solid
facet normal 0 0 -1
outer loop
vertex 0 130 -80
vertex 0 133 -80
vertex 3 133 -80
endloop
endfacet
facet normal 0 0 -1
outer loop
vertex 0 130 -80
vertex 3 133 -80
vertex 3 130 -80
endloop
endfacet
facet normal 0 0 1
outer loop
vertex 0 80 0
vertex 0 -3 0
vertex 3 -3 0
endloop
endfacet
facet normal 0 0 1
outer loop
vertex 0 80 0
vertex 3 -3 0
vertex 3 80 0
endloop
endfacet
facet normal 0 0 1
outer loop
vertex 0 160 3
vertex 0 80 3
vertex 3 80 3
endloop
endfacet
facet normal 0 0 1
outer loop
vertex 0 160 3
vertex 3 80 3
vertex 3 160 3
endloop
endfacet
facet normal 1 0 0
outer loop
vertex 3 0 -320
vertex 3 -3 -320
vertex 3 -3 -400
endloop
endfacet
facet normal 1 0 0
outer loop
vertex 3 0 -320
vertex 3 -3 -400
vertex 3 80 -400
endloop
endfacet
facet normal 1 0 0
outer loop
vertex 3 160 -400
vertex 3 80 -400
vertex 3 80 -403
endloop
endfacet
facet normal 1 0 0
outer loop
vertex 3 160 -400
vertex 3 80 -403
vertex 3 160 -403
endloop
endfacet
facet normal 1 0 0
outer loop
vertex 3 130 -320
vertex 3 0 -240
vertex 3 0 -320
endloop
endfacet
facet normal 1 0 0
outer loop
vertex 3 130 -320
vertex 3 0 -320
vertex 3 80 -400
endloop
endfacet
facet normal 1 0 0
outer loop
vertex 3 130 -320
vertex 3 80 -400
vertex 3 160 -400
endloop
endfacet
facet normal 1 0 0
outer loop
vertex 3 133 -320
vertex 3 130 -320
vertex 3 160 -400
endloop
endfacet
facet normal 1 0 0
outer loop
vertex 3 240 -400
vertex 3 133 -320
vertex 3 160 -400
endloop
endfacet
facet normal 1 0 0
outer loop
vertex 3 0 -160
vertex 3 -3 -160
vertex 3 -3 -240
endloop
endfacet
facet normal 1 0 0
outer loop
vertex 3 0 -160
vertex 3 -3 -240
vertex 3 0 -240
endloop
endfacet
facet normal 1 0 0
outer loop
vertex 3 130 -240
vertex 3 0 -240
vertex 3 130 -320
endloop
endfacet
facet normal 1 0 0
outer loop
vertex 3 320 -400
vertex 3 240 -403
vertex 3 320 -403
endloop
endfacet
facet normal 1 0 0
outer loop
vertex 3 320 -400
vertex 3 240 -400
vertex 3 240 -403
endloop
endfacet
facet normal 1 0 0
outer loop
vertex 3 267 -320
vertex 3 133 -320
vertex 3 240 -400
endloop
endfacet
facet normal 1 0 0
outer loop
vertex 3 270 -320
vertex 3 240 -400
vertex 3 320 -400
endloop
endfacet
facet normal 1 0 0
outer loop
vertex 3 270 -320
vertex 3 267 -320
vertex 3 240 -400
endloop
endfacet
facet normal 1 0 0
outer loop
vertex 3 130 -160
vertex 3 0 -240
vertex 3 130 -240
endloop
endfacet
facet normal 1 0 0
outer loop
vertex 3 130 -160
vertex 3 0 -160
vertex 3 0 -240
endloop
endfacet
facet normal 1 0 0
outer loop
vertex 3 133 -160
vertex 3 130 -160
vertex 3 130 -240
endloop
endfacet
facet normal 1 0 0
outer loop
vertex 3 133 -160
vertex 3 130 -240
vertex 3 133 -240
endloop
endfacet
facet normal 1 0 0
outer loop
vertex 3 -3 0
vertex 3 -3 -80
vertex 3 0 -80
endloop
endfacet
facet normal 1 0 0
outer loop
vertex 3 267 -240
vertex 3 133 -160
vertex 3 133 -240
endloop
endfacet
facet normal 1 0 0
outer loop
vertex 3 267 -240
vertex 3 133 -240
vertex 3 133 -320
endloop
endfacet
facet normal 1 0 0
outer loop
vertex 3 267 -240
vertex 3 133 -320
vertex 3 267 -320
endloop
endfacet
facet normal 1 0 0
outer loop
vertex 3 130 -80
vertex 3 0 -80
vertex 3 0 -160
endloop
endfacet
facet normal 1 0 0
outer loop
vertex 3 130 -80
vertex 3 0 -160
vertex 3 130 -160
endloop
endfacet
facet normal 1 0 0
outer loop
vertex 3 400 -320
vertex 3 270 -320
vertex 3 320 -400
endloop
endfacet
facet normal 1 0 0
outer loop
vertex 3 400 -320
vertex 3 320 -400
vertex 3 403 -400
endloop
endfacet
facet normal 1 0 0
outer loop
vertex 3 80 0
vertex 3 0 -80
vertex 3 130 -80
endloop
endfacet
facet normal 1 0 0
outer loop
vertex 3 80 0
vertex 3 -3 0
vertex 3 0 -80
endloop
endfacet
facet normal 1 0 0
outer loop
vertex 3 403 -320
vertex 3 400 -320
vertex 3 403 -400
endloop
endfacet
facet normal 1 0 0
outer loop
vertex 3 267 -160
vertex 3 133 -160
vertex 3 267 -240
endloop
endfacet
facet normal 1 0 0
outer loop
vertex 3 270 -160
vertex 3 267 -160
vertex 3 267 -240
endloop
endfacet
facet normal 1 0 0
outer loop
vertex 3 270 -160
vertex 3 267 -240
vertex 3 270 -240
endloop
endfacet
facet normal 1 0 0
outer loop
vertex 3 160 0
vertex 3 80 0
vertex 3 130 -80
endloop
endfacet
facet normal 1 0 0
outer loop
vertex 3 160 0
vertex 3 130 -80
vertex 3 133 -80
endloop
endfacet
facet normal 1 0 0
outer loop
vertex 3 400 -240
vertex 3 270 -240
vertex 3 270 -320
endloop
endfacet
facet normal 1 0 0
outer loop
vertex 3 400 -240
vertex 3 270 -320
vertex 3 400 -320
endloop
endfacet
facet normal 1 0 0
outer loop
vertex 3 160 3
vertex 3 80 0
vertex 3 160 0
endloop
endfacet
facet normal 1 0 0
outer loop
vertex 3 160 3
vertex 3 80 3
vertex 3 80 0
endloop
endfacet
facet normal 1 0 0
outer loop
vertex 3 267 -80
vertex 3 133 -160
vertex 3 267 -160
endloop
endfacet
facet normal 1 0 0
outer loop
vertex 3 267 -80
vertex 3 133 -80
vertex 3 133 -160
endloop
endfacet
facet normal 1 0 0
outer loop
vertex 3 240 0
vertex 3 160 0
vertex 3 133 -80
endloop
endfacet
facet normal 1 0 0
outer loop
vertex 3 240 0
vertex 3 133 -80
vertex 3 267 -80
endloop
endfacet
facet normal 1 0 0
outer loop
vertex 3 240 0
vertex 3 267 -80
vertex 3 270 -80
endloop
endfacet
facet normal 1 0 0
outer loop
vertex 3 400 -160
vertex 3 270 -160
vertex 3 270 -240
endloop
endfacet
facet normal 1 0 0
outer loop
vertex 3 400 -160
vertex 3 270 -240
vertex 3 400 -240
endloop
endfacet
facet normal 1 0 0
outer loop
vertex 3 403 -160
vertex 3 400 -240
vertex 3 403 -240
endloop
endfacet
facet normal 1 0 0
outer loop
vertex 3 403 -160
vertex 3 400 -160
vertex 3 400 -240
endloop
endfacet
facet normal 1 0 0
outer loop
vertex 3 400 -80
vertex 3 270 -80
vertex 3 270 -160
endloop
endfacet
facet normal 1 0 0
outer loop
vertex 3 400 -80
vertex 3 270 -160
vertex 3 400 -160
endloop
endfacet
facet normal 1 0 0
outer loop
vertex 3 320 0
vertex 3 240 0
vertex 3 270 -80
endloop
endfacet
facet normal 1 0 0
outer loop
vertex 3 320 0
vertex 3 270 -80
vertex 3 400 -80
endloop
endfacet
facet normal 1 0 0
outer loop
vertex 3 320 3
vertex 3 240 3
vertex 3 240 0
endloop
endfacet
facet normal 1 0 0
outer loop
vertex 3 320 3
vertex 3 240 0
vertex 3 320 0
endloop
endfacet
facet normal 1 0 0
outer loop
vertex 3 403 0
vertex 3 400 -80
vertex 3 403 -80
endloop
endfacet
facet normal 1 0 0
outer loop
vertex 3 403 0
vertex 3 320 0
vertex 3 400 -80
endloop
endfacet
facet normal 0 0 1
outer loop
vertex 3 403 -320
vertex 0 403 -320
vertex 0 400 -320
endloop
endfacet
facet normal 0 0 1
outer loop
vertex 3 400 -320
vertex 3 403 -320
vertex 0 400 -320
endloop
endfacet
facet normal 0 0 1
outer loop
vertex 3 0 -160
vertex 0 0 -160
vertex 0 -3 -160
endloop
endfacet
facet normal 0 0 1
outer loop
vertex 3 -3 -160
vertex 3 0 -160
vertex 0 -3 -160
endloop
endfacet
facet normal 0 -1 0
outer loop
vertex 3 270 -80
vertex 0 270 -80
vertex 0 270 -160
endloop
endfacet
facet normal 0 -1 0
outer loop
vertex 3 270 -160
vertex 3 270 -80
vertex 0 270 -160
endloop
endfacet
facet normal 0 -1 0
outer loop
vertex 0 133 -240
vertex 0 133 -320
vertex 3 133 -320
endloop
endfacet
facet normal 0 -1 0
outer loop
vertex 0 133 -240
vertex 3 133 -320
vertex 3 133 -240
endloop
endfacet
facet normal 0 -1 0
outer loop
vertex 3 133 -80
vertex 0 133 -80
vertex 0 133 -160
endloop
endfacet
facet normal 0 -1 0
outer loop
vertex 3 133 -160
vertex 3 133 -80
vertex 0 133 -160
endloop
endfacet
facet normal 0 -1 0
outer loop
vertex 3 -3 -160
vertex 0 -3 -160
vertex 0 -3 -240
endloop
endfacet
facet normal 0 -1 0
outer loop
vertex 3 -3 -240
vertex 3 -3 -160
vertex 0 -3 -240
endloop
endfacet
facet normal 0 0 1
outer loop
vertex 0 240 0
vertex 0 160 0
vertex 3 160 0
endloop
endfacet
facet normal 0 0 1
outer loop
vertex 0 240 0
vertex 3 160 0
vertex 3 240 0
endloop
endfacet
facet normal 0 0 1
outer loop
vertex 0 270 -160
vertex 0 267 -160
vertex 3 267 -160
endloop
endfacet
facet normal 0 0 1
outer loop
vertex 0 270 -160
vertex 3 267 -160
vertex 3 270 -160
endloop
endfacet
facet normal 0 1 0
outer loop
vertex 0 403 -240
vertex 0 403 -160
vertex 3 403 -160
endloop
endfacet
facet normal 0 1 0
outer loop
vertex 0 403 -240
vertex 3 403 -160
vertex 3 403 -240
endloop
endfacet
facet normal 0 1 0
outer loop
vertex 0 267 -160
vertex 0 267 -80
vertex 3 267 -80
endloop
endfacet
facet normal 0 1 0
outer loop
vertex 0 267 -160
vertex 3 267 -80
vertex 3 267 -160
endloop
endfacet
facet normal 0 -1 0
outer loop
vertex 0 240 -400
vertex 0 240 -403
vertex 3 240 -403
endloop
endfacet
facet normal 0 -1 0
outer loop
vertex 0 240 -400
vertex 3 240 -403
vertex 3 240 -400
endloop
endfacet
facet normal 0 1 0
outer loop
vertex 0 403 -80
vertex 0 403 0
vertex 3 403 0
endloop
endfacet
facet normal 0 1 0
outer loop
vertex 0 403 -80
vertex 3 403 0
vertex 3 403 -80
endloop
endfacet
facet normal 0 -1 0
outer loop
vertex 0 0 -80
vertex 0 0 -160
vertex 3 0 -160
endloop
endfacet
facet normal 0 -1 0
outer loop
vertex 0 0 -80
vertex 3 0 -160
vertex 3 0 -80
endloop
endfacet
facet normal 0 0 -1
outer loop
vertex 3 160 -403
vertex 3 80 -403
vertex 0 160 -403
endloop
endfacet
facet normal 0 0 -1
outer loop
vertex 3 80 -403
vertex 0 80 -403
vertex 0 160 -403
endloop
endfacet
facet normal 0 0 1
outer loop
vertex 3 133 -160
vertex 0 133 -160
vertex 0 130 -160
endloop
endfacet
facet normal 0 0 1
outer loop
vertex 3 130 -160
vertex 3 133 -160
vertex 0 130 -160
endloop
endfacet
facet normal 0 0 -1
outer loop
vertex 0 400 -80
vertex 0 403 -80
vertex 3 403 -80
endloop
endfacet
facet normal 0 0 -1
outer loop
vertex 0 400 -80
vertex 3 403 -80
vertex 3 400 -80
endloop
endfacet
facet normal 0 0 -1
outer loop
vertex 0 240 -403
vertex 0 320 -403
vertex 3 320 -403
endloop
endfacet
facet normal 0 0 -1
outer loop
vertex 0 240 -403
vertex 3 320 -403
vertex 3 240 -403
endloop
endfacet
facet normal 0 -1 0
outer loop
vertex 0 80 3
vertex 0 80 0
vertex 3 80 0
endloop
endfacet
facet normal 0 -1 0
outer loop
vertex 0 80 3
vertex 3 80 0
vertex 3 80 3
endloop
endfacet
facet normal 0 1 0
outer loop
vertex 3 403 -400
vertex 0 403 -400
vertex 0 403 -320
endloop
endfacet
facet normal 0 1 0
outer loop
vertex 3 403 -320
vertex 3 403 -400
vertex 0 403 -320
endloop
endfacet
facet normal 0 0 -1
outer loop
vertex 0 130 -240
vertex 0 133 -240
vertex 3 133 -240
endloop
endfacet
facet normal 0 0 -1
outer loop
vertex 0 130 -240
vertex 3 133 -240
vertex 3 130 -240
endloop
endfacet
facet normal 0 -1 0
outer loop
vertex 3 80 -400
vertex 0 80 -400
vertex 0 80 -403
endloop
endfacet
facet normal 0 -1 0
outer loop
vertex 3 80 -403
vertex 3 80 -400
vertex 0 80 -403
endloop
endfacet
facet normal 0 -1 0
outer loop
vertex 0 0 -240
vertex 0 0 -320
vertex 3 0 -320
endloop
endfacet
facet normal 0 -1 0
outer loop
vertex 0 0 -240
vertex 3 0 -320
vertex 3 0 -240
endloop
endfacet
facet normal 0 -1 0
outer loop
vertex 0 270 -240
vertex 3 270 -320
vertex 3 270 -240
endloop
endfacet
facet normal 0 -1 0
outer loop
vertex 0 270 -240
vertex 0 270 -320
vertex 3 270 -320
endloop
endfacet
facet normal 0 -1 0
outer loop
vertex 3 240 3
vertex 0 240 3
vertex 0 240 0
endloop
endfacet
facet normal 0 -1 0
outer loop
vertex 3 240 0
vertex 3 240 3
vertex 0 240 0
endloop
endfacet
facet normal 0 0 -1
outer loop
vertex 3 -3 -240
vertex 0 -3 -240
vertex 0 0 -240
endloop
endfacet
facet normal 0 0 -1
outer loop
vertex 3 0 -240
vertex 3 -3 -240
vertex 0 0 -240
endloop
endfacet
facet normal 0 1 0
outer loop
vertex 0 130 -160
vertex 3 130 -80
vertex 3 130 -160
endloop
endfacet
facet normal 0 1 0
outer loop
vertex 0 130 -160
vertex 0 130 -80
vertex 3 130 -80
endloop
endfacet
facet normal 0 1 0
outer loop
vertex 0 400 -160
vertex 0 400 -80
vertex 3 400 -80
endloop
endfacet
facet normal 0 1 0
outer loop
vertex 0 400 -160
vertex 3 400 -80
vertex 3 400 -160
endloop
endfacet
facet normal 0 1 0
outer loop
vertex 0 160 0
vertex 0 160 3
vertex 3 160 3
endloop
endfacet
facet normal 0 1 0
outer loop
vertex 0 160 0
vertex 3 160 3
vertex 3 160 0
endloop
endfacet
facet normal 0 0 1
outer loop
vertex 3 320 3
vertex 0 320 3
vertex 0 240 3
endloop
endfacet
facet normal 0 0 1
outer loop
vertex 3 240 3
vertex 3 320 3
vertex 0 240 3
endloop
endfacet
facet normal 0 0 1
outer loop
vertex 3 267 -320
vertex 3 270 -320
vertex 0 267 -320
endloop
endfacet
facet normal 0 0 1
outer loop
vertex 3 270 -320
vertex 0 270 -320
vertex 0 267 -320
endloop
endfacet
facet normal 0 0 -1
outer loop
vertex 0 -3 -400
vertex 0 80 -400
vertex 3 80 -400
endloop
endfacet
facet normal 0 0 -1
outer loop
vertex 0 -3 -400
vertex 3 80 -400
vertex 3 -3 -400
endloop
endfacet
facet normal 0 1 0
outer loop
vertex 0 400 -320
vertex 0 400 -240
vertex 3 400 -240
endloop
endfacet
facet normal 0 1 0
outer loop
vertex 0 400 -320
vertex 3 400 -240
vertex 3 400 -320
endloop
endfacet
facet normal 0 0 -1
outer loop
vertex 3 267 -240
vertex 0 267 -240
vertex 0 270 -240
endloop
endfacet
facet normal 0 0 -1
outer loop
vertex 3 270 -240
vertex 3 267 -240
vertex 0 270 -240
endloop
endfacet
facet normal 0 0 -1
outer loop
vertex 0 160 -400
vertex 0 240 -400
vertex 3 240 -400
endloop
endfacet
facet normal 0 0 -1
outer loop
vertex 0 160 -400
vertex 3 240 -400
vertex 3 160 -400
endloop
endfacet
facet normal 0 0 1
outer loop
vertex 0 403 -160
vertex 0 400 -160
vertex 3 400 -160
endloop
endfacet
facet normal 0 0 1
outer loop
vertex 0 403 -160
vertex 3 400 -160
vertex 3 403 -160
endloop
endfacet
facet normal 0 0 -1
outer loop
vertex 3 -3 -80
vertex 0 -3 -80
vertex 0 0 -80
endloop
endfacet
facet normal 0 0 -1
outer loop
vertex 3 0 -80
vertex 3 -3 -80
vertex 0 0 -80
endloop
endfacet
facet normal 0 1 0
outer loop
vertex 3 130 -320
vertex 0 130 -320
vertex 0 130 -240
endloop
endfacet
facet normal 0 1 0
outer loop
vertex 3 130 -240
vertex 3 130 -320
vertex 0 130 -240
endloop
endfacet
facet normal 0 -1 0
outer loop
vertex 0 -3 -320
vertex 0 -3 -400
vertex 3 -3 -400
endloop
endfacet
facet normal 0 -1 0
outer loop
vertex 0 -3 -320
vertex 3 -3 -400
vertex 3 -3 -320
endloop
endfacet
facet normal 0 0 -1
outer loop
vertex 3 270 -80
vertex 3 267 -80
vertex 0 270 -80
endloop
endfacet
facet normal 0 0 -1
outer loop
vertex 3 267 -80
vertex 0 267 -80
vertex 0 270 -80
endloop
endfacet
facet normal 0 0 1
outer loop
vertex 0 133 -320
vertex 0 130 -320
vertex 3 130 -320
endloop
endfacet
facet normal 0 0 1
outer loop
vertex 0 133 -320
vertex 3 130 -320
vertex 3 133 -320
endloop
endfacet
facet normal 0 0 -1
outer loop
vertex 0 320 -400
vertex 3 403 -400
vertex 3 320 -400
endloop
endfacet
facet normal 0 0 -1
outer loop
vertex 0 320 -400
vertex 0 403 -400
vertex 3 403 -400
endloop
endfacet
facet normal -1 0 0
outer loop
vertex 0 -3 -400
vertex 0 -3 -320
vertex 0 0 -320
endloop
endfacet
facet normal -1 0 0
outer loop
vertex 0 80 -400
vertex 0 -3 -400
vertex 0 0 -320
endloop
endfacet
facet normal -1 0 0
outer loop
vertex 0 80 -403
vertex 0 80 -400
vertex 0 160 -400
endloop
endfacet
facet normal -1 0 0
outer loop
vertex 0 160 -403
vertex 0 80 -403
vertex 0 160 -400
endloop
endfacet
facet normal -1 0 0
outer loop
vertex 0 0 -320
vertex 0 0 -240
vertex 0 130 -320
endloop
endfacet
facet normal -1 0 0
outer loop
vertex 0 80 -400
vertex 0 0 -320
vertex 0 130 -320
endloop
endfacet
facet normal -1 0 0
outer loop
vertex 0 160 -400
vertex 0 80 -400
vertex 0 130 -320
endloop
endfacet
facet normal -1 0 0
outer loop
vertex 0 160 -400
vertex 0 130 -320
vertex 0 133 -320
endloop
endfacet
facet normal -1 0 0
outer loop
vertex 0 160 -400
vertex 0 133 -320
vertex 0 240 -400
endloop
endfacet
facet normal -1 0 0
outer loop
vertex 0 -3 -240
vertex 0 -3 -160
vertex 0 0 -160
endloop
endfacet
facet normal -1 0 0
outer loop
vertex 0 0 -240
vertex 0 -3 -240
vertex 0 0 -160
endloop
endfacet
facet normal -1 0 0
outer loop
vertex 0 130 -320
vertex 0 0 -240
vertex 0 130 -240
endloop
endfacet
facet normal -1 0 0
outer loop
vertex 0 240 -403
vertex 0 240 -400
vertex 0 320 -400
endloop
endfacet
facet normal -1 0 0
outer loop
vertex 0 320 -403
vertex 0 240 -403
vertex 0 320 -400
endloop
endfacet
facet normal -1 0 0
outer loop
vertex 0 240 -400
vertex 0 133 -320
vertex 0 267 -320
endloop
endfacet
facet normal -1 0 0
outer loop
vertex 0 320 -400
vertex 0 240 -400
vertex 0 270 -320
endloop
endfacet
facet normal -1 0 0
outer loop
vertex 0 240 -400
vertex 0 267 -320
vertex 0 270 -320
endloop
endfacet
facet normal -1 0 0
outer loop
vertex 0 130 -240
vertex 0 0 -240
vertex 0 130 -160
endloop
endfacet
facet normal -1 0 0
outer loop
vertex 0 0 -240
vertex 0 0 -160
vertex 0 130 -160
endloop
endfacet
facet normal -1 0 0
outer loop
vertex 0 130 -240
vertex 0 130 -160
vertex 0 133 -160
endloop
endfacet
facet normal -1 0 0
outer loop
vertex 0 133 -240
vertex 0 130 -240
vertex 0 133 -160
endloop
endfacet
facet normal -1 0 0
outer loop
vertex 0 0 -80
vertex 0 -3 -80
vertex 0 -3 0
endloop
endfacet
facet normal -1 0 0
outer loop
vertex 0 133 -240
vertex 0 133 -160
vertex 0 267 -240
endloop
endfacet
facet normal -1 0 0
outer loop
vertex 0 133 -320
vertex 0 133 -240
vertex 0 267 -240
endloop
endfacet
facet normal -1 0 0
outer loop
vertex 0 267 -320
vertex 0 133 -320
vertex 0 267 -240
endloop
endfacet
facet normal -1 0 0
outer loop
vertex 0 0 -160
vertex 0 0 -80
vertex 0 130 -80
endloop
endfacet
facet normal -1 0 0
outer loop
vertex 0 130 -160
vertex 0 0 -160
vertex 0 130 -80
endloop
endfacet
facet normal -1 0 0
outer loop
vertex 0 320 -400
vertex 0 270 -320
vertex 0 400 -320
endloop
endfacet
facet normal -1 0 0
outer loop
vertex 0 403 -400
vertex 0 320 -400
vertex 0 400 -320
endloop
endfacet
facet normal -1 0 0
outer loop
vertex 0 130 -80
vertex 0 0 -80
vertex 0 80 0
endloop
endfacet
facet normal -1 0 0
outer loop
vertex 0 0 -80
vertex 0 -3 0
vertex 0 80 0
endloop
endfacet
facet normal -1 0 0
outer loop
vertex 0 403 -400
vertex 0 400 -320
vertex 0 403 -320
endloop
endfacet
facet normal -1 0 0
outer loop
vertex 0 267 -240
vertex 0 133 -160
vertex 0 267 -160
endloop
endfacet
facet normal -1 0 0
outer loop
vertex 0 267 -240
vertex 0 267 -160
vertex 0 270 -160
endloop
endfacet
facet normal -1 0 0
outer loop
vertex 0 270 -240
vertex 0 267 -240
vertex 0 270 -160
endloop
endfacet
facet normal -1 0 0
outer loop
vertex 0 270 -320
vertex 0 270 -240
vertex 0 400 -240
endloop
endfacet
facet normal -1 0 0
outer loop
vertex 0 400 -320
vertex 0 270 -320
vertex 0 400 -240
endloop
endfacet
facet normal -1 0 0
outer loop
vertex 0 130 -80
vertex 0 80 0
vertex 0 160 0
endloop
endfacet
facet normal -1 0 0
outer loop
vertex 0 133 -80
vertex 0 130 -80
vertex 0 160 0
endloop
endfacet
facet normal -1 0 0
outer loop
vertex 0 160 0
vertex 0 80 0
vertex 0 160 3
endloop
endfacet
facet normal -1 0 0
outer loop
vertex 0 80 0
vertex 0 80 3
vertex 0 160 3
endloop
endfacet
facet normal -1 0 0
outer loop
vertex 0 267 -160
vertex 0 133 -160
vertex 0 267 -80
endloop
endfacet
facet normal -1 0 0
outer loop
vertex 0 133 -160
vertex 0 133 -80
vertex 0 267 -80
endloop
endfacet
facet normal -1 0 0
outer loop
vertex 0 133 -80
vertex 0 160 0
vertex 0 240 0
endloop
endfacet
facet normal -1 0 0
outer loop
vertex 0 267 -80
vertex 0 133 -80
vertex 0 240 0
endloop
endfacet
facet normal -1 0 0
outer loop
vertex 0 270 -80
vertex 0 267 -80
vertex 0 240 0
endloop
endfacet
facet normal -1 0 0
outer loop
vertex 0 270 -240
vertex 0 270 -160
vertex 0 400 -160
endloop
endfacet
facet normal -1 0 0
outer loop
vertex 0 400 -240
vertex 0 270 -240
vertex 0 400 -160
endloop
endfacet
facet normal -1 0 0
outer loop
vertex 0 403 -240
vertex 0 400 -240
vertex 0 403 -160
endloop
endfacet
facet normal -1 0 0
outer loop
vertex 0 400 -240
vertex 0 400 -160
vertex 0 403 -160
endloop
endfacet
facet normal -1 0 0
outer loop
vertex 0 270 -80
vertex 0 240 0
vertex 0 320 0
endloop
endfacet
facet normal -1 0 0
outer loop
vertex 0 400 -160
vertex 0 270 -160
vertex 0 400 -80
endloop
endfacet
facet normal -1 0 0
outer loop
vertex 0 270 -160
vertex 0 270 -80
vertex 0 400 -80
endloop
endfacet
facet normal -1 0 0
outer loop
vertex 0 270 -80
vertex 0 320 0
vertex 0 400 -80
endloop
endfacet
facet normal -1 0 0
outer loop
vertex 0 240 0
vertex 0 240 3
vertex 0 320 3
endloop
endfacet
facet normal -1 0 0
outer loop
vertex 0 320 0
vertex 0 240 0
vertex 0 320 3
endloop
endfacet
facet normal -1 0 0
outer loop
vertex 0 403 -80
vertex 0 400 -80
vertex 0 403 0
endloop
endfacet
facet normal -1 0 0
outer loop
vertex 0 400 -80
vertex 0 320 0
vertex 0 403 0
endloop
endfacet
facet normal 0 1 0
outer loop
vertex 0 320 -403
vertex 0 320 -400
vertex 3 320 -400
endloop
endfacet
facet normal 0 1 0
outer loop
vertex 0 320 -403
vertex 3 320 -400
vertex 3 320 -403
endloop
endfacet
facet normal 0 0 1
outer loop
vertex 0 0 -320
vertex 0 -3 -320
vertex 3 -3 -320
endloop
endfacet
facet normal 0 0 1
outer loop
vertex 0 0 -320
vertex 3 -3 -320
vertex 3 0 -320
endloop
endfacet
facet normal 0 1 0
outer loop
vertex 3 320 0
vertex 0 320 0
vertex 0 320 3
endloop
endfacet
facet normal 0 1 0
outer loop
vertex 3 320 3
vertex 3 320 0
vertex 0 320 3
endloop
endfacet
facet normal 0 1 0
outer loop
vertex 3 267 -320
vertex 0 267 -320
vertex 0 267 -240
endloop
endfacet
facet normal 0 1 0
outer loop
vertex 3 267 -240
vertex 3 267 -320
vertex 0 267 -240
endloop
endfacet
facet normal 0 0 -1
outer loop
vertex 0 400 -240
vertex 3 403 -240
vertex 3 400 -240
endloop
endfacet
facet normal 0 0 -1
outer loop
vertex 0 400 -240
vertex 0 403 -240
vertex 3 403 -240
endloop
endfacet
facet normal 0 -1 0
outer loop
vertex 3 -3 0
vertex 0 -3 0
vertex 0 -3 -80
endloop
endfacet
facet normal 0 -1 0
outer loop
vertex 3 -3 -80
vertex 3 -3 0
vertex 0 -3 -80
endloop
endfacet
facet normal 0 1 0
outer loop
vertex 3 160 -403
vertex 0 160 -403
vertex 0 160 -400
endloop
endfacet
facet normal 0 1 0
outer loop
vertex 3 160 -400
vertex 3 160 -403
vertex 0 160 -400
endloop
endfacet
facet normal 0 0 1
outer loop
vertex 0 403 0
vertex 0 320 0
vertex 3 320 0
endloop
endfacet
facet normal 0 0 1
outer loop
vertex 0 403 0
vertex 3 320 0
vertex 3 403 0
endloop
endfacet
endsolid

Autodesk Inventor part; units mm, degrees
ref_plane "YZ Plane" through (0, 0, 0) normal (1, 0, 0) x (0, 1, 0)
ref_plane "XZ Plane" through (0, 0, 0) normal (0, 1, 0) x (-1, 0, 0)
ref_plane "XY Plane" through (0, 0, 0) normal (0, 0, 1) x (1, 0, 0)
sketch "Sketch1" plane through (0, 0, 0) normal (1, 0, 0) x (0, 1, 0)
  line L0 (0, 0) -> (400, 0)
  line L1 (400, 0) -> (400, -400)
  line L2 (400, -400) -> (0, -400)
  line L3 (0, -400) -> (0, 0)
  line L4 (400, 0) -> (403, 0)
  line L5 (403, 0) -> (403, -80)
  line L6 (403, -80) -> (400, -80)
  line L7 (400, -400) -> (403, -400)
  line L8 (403, -400) -> (403, -320)
  line L9 (403, -320) -> (400, -320)
  line L10 (400, -160) -> (403, -160)
  line L11 (403, -160) -> (403, -240)
  line L12 (403, -240) -> (400, -240)
  line L13 (80, 0) -> (80, 3)
  line L14 (80, 3) -> (160, 3)
  line L15 (160, 3) -> (160, 0)
  line L16 (320, 0) -> (320, 3)
  line L17 (320, 3) -> (240, 3)
  line L18 (240, 3) -> (240, 0)
  line L19 (200, 0) -> (200, -400) construction
  line L20 (0, -200) -> (400, -200) construction
  line L21 (0, -400) -> (400, -400)
  line L22 (80, -400) -> (80, -403)
  line L23 (80, -403) -> (160, -403)
  line L24 (160, -403) -> (160, -400)
  line L25 (320, -400) -> (320, -403)
  line L26 (320, -403) -> (240, -403)
  line L27 (240, -403) -> (240, -400)
  line L28 (0, 0) -> (0, -400)
  line L29 (0, 0) -> (-3, 0)
  line L30 (-3, 0) -> (-3, -80)
  line L31 (-3, -80) -> (0, -80)
  line L32 (0, -400) -> (-3, -400)
  line L33 (-3, -400) -> (-3, -320)
  line L34 (-3, -320) -> (0, -320)
  line L35 (0, -160) -> (-3, -160)
  line L36 (-3, -160) -> (-3, -240)
  line L37 (-3, -240) -> (0, -240)
  line L38 (0, 0) -> (130, 0)
  line L39 (130, 0) -> (133, 0)
  line L40 (133, 0) -> (267, 0)
  line L41 (267, 0) -> (270, 0)
  line L42 (133, -80) -> (130, -80)
  line L43 (133, -80) -> (133, -160)
  line L44 (133, -160) -> (130, -160)
  line L45 (130, -320) -> (133, -320)
  line L46 (133, -320) -> (133, -240)
  line L47 (133, -240) -> (130, -240)
  line L48 (133, -80) -> (130, -80)
  line L49 (130, -80) -> (130, -160)
  line L50 (130, -320) -> (130, -240)
  line L51 (400, -200) -> (0, -200) construction
  line L52 (267, -80) -> (270, -80)
  line L53 (267, -80) -> (267, -160)
  line L54 (267, -160) -> (270, -160)
  line L55 (270, -320) -> (267, -320)
  line L56 (267, -320) -> (267, -240)
  line L57 (267, -240) -> (270, -240)
  line L58 (267, -80) -> (270, -80)
  line L59 (270, -80) -> (270, -160)
  line L60 (270, -320) -> (270, -240)
  dimension "d0" = 400
  dimension "d1" = 400
  dimension "d2" = 3
  dimension "d3" = 80
  dimension "d4" = 3
  dimension "d5" = 80
  dimension "d6" = 80
  dimension "d7" = 3
  dimension "d8" = 80
  dimension "d13" = 3
  dimension "d14" = 80
  dimension "d17" = 130
  dimension "d18" = 3
  dimension "d19" = 134
  dimension "d20" = 3
  dimension "d21" = 80
  dimension "d22" = 80
  dimension "d24" = 80
  dimension "d25" = 3
extrude "Extrusion1" add sketch "Sketch1" along normal blind 3
properties part number "Pared estanteria"
